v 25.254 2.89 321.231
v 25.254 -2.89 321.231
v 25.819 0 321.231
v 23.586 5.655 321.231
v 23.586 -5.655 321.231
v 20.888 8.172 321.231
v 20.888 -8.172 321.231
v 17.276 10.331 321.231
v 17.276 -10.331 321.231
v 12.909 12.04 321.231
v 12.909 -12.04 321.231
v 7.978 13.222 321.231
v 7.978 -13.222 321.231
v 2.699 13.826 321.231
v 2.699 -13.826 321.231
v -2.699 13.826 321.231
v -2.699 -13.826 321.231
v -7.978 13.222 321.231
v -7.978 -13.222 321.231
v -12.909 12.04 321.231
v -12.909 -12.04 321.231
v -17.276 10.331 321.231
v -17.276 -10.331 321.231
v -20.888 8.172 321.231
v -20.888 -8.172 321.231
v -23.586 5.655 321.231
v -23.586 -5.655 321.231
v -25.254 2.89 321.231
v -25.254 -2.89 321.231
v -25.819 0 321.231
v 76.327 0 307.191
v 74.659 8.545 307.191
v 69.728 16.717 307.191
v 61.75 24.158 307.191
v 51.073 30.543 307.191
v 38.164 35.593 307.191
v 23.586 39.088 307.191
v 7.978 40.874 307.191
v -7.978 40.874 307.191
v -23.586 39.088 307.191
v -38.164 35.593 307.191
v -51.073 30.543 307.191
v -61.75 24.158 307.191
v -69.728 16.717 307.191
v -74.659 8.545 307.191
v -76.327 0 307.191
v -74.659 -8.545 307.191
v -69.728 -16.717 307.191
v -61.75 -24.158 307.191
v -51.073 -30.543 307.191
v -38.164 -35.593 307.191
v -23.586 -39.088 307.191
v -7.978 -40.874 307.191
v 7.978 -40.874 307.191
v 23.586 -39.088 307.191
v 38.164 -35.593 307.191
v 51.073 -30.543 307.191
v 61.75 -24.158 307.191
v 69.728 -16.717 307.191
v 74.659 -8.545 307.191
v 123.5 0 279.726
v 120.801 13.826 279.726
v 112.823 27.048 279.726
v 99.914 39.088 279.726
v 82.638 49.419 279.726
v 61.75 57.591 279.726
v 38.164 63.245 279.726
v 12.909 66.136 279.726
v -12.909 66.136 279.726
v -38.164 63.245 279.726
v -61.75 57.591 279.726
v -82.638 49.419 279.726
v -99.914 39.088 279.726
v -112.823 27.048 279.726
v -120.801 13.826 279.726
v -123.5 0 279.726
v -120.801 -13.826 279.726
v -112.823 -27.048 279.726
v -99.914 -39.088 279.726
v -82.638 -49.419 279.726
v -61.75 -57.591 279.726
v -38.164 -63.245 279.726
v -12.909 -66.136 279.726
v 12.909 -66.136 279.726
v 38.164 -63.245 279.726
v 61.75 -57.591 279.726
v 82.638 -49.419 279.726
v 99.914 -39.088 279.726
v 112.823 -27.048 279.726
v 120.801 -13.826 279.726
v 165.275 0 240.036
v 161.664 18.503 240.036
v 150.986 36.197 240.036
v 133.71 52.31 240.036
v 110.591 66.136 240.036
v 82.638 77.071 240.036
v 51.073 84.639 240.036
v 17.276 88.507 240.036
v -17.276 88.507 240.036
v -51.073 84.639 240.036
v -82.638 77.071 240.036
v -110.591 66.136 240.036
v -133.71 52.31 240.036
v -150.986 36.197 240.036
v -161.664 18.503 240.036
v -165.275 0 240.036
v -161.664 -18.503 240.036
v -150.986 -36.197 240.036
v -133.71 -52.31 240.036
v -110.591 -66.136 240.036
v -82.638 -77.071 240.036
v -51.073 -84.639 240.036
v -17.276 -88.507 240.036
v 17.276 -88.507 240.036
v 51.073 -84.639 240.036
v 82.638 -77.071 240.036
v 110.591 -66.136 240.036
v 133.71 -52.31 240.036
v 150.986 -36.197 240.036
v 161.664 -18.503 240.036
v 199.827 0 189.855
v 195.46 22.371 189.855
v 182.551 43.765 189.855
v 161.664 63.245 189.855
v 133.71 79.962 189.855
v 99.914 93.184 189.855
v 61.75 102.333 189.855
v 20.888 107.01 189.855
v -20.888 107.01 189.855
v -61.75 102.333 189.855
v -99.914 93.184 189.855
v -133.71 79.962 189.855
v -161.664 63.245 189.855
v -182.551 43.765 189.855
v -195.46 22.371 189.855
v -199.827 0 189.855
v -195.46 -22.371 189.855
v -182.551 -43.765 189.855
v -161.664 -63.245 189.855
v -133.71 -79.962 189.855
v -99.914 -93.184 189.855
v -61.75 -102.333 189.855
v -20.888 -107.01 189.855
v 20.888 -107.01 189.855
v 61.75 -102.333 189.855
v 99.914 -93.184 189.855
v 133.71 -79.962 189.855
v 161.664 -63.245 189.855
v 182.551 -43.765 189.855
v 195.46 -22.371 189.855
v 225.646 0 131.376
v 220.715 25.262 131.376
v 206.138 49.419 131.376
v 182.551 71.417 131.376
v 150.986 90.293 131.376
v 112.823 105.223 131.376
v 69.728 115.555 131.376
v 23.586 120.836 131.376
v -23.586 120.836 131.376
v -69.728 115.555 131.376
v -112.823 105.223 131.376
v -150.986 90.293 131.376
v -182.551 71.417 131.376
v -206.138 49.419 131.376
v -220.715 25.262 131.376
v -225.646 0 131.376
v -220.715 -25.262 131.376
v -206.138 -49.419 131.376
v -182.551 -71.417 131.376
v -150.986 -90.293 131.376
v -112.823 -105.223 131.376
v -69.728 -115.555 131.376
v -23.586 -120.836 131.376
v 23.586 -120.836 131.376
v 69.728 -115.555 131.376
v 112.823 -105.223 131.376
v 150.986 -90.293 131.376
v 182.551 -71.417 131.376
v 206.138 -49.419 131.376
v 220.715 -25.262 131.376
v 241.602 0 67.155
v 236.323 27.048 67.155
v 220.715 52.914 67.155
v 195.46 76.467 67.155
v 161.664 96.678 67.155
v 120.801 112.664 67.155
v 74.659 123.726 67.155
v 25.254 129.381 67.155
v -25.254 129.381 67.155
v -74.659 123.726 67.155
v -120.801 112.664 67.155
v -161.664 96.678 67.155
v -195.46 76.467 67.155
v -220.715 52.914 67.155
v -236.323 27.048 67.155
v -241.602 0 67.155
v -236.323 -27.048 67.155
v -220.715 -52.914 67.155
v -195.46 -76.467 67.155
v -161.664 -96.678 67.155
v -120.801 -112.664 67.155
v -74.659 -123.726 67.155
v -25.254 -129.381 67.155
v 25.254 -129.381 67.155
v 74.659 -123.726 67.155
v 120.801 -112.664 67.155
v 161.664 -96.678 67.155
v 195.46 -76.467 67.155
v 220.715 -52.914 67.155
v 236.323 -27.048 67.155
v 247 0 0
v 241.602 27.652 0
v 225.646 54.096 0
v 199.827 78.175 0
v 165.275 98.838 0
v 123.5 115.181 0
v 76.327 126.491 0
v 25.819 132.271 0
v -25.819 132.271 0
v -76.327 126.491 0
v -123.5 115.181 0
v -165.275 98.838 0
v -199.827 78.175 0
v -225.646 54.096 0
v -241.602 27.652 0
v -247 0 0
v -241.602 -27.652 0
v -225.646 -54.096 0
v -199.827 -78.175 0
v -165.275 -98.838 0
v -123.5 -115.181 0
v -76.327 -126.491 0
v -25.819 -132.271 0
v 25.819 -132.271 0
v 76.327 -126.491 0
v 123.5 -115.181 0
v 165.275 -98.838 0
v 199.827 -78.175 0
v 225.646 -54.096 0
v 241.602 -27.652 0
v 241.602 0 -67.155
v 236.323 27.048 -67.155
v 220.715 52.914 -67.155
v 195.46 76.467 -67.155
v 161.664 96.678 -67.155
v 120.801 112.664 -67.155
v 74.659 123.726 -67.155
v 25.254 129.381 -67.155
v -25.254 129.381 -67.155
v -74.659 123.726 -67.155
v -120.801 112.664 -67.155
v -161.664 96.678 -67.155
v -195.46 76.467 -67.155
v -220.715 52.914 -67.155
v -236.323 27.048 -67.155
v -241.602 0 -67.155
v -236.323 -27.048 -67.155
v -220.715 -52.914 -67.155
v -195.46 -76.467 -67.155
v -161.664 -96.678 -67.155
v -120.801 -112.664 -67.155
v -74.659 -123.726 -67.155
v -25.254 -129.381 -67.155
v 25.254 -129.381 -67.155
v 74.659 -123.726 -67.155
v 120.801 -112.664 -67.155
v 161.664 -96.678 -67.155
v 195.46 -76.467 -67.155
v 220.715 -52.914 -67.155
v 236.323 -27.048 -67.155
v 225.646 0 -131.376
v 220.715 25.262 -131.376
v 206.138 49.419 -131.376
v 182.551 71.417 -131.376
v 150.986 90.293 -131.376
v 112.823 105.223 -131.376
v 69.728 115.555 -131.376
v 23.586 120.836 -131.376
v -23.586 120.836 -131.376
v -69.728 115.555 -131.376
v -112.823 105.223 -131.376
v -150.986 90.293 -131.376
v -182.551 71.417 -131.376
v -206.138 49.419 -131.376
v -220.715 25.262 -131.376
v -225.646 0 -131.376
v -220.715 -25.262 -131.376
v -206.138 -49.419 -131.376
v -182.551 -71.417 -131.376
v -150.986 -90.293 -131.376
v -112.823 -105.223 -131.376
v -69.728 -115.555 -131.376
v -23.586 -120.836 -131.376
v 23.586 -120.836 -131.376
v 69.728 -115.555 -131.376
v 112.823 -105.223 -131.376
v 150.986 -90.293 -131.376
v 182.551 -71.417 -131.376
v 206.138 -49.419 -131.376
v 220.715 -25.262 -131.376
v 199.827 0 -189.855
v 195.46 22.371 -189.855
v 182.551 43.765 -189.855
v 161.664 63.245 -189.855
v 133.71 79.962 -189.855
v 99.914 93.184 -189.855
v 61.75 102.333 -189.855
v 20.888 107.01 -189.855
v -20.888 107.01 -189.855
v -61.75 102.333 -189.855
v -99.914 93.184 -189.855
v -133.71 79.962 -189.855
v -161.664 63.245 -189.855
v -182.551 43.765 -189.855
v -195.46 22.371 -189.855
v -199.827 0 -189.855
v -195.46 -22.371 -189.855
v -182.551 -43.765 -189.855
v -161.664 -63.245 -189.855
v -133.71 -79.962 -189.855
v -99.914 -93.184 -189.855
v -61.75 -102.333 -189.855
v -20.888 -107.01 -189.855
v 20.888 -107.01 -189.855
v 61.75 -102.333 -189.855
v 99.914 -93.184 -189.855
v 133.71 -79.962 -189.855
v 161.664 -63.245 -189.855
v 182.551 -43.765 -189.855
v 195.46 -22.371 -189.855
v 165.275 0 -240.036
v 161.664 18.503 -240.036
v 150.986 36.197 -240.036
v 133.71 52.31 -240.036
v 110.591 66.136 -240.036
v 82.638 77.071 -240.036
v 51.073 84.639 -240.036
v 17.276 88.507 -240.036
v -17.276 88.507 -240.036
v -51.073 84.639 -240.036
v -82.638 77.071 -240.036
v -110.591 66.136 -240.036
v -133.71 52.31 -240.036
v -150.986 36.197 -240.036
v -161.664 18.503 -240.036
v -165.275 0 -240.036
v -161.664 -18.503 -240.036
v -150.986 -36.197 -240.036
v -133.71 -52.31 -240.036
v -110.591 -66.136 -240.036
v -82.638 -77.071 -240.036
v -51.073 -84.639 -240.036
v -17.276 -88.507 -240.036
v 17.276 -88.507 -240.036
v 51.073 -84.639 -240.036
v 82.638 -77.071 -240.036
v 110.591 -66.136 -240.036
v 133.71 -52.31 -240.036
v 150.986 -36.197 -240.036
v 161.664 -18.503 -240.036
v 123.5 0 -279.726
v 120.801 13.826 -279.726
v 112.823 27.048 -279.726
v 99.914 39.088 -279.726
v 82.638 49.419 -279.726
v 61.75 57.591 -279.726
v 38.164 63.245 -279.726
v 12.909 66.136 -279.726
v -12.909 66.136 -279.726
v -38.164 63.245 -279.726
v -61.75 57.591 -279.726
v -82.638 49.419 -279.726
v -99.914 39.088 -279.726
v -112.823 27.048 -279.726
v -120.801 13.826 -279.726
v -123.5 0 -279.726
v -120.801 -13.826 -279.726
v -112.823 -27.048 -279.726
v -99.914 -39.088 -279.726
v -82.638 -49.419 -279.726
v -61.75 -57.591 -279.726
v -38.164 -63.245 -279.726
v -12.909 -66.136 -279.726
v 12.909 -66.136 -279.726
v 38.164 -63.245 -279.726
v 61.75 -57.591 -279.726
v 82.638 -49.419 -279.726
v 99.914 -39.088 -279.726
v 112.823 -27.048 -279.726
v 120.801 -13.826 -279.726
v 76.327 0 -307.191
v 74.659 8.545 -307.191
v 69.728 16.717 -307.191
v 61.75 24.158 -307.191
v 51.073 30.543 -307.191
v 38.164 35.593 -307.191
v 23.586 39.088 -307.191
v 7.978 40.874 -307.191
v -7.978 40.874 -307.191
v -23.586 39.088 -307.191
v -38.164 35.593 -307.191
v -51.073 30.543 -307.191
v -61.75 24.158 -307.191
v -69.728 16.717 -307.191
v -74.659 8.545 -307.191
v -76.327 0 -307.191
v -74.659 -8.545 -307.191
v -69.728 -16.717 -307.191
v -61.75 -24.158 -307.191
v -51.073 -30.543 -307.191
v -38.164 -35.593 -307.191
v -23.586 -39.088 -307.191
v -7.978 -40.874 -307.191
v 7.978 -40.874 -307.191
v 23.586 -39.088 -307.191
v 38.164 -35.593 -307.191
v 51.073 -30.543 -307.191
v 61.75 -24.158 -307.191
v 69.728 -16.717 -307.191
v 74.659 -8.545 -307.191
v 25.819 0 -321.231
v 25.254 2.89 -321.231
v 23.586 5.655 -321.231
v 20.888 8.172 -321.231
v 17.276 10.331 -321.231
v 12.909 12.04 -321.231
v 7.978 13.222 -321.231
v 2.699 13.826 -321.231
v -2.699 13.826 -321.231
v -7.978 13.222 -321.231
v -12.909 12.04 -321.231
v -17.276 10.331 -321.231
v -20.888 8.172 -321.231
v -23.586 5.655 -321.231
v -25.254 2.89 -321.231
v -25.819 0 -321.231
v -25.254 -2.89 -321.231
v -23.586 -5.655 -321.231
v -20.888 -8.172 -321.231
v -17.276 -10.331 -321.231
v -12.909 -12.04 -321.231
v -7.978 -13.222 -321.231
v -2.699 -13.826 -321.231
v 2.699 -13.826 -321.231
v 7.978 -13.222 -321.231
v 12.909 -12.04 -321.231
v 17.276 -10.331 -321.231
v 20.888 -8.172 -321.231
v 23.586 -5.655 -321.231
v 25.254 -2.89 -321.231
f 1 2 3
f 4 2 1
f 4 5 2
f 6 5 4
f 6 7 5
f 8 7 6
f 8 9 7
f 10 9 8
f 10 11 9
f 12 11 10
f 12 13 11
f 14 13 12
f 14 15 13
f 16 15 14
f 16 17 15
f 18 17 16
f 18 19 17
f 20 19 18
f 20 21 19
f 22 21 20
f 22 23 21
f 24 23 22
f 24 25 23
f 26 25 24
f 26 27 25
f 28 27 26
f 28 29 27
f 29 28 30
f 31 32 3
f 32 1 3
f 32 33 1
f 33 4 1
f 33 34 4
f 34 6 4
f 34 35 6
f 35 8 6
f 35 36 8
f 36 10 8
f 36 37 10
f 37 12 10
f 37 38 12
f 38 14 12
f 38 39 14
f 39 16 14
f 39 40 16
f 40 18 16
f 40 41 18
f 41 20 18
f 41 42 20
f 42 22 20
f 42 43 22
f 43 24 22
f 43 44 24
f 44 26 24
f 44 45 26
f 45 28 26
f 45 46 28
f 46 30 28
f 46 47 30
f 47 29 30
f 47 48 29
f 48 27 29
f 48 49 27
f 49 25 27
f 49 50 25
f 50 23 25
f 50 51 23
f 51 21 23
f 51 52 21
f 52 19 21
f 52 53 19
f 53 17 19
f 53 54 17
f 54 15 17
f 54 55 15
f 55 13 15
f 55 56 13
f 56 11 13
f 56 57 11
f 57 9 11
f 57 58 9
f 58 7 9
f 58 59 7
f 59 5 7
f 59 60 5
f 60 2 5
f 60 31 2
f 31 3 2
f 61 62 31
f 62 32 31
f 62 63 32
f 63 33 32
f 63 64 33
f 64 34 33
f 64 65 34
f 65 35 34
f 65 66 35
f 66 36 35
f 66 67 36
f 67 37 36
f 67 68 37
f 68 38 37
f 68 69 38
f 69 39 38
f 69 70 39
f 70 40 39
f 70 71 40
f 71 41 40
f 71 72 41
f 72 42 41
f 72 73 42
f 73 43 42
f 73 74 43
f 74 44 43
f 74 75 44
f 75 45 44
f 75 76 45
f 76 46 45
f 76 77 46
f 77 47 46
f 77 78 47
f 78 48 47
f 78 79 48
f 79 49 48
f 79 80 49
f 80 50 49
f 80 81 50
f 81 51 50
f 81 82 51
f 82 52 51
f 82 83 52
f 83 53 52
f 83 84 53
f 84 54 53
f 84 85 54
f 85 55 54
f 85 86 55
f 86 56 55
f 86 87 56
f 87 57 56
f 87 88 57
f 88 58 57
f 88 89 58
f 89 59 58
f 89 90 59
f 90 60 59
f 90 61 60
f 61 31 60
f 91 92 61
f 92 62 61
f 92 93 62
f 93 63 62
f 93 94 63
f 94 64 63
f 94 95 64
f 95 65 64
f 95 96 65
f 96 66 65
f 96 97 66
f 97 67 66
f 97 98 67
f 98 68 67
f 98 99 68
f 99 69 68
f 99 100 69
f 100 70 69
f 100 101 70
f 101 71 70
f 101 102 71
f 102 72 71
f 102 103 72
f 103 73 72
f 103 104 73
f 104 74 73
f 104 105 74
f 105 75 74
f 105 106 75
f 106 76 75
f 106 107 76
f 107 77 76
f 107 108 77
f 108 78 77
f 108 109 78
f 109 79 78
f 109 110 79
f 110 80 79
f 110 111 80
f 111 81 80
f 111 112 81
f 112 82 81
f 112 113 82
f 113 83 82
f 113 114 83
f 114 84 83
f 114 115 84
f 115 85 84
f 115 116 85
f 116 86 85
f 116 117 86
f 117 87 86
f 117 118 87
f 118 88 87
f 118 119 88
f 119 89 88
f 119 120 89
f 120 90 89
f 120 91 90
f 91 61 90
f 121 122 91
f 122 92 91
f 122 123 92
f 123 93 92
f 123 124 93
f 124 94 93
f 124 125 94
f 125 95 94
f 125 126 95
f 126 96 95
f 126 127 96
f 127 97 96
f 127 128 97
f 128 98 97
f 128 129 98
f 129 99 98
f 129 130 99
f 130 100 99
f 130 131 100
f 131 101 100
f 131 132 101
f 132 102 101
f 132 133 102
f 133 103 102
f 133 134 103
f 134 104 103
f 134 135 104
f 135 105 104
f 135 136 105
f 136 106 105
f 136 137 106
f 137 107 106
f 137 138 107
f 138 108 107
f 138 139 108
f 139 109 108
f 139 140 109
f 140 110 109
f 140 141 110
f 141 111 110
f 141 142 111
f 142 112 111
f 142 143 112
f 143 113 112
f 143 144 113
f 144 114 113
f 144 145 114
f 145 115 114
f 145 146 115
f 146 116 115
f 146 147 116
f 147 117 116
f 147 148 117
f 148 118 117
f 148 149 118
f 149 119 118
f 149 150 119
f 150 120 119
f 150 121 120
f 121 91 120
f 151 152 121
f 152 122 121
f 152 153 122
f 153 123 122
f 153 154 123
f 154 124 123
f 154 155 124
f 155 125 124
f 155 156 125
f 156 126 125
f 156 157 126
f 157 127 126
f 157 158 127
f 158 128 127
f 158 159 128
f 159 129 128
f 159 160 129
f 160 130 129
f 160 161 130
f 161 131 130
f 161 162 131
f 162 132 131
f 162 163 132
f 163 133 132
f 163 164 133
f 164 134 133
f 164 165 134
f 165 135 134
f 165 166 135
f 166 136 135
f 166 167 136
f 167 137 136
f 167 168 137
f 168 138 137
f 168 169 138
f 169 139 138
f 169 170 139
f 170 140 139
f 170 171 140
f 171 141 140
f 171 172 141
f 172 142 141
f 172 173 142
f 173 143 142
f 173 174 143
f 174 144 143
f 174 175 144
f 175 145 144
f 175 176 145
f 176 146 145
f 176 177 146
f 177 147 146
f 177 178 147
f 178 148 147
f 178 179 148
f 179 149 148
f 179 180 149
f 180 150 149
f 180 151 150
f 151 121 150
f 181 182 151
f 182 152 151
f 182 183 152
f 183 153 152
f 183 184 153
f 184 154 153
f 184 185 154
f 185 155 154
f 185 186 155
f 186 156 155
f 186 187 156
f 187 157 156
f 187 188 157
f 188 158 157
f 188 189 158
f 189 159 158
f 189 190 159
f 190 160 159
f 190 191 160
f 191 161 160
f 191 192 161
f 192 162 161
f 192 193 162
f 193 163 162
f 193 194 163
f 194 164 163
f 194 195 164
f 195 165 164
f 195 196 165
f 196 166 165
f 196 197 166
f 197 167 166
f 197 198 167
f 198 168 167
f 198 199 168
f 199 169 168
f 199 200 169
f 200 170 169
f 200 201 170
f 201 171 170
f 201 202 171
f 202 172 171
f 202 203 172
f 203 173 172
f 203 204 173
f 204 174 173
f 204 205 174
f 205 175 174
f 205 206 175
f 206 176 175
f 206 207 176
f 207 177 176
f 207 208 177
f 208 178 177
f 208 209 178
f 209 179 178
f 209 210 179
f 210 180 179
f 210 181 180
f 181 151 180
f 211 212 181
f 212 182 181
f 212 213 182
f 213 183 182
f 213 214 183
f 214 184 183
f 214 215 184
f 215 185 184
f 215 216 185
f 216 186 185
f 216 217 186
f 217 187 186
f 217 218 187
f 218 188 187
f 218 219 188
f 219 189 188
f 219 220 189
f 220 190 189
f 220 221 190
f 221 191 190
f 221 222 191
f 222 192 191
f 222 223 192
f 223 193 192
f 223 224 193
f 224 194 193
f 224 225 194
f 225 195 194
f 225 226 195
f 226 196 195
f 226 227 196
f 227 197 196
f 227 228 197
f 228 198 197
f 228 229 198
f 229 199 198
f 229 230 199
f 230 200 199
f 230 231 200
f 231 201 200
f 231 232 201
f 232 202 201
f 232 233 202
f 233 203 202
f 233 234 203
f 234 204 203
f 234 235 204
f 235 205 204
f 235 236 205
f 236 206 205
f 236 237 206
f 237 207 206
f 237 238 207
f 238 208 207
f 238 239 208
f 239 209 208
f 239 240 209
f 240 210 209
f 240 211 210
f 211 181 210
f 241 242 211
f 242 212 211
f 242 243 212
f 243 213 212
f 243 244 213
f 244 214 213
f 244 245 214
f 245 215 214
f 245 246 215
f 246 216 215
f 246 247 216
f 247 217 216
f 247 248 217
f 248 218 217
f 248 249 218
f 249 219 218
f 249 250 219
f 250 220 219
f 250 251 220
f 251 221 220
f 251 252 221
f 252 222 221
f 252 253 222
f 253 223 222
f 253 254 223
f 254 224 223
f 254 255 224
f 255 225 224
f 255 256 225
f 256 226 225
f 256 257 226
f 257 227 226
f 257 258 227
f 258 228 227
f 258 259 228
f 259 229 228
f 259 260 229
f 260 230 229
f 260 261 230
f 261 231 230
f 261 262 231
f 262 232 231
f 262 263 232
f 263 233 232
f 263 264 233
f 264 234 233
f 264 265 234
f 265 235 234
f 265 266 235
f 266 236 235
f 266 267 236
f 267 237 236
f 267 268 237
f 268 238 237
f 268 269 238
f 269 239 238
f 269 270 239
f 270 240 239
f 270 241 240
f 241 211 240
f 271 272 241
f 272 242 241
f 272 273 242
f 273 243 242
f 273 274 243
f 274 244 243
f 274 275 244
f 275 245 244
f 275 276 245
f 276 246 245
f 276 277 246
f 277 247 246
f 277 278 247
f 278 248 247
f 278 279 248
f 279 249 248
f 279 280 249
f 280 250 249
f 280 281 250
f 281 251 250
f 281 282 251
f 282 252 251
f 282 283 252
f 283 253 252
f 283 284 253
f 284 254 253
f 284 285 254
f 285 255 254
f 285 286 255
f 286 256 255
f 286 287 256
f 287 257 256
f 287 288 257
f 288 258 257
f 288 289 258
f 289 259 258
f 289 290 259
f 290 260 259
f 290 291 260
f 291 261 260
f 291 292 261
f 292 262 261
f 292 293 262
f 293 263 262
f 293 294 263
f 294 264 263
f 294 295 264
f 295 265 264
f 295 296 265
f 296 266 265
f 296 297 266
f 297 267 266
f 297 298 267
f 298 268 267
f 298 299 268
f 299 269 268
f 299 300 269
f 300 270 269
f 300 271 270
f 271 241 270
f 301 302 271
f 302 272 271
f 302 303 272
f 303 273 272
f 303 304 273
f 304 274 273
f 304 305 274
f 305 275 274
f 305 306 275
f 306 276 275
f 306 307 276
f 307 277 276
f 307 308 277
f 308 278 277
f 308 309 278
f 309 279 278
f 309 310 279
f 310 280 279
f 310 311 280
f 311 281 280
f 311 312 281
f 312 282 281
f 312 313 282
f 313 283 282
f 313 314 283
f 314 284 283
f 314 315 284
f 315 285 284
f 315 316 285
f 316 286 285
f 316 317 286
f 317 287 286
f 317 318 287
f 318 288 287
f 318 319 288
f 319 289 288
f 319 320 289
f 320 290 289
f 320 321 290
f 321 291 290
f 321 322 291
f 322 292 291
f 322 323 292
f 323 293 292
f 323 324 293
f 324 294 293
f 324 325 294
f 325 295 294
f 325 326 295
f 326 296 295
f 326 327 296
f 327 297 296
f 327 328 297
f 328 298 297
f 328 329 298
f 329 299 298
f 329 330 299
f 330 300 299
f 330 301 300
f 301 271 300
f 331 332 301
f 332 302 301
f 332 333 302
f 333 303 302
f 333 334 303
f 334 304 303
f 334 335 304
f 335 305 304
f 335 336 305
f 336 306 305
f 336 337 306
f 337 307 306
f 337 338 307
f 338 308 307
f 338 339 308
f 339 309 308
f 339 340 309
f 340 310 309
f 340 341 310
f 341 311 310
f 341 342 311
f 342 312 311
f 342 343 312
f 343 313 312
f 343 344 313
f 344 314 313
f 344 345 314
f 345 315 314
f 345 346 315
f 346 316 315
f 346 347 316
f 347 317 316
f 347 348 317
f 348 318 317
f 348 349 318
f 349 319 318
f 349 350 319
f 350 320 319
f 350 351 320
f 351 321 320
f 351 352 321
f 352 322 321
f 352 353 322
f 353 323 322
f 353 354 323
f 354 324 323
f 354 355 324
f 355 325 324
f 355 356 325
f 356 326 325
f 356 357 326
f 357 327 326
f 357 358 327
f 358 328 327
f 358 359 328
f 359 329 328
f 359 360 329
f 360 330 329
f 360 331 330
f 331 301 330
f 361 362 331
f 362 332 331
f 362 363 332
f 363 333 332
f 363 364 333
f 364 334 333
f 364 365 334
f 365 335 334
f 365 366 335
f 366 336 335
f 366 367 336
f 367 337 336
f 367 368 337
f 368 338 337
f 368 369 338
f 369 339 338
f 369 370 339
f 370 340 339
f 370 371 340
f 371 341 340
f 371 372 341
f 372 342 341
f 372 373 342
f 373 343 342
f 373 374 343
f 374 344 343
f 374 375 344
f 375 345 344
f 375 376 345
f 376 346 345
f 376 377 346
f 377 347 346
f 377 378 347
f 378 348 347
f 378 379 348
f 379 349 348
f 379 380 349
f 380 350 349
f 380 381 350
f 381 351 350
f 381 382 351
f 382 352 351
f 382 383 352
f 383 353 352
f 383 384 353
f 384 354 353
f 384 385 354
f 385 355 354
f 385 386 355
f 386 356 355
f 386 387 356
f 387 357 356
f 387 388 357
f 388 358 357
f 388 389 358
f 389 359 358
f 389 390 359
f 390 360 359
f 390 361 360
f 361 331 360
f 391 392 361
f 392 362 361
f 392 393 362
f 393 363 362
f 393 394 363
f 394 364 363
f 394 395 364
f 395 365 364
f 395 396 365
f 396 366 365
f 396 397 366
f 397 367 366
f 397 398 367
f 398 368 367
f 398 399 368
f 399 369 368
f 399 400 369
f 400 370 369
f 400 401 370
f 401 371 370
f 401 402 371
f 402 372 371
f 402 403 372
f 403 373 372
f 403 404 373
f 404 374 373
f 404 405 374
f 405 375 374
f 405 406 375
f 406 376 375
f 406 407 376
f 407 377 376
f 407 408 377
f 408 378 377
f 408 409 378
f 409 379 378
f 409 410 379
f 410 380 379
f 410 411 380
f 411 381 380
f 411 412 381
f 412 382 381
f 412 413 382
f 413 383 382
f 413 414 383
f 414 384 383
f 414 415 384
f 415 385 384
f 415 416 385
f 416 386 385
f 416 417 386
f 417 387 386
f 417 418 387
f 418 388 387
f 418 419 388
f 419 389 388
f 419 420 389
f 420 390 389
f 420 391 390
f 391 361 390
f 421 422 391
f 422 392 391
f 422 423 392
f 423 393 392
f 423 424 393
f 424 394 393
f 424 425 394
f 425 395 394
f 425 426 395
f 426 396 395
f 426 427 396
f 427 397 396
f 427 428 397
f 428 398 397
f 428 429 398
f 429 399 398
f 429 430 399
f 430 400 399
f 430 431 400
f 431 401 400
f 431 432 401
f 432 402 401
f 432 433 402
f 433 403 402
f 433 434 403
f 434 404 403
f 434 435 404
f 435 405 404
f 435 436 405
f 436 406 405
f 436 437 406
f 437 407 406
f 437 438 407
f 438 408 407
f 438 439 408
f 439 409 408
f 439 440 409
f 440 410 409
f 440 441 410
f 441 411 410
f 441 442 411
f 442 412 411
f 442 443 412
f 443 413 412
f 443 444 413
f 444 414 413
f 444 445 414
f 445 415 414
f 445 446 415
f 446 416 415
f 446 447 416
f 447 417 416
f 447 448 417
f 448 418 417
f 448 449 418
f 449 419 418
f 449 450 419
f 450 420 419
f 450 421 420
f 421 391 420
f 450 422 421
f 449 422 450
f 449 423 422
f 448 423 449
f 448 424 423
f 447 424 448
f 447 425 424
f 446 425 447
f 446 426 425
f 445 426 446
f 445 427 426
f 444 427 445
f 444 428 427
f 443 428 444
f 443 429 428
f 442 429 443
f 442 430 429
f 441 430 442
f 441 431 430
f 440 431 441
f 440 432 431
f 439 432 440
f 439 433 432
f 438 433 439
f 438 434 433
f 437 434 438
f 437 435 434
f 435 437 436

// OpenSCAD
// Generated by SolidPython 1.0.1 on 2020-07-29 00:46:50


scale(v = [13, 7, 17]) {
	sphere(r = 19);
}
/***********************************************
*********      SolidPython code:      **********
************************************************
 
# import packages: SolidPython
from solid import *
from solid.utils import *
from itertools import chain, combinations, permutations


class Resize:

    def __init__(self, scad_file):
        self.scad_file = scad_file
        #self.scad_file = import_scad(scad_file)
        # cone/cylinder param:
        self.r1 = 0
        self.r2 = 0
        self.h = 0
        # rectangular prism param:
        self.w = 0
        self.l = 0
        # ellipse param:
        self.r = 0

    # import OpenScad code (file name corresponds to shape)


    # classify shape + parameters
    def assign(self, param1, param2, param3):
        if self.scad_file == 'cone.scad':
            self.r1 = param1
            self.r2 = param2
            self.h = param3
        elif self.scad_file == 'cylinder.scad':
            self.r1 = param1
            self.r2 = param2
            self.h = param3
        elif self.scad_file == 'rectangularPrism.scad':
            self.h = param1
            self.l = param2
            self.w = param3
        else:
            self.r = param1
            self.h = param2

    # resize parameters
    def iterate(self):
        x = range(3, 20, 2)
        i = 1
        if self.scad_file == 'cone.scad':
            tempList = list(permutations(x, 2))
            for temp in tempList:
                param1 = temp[0]
                param2 = temp[1]
                filepath = 'produced_scad_files/' + 'cone' + str(param1) + '_' + str(param2) + '_' + '.scad'
                scad_render_to_file(cylinder(h=param1, r1=param2, r2=0), filepath)

        elif self.scad_file == 'cylinder.scad':
            tempList = list(permutations(x, 3))
            for temp in tempList:
                param1 = temp[0]
                param2 = temp[1]
                filepath = 'produced_scad_files/' + 'cylinder' + str(param1) + '_' + str(param2) + '_' + '.scad'
                scad_render_to_file(cylinder(h=param1, r1=param2, r2=param2), filepath)

        elif self.scad_file == 'rectangularPrism.scad':
            tempList = list(permutations(x, 3))
            for temp in tempList:
                param1 = temp[0]
                param2 = temp[1]
                param3 = temp[2]
                filepath = 'produced_scad_files/' + 'rectangularPrism' + str(param1) + '_' + str(param2) + '_' + str(
                    param3) + '.scad'
                scad_render_to_file(cube(size=(param1, param2, param3)), filepath)

        elif self.scad_file == 'ellipse.scad':
            tempList = list(permutations(x, 4))
            for temp in tempList:
                param1 = temp[0]
                param2 = temp[1]
                param3 = temp[2]
                param4 = temp[3]
                filepath = 'produced_scad_files/' + 'ellipse' + str(param1) + '_' + str(param2) + '_' + str(param3) + '_' + str(param4) + '.scad'
                scad_render_to_file(scale([param1, param2, param3])(sphere(r=param4)), filepath)

    def render_to_scadfile(self):
        scad_render_to_file(scad, 'example.scad') 
 
************************************************/
